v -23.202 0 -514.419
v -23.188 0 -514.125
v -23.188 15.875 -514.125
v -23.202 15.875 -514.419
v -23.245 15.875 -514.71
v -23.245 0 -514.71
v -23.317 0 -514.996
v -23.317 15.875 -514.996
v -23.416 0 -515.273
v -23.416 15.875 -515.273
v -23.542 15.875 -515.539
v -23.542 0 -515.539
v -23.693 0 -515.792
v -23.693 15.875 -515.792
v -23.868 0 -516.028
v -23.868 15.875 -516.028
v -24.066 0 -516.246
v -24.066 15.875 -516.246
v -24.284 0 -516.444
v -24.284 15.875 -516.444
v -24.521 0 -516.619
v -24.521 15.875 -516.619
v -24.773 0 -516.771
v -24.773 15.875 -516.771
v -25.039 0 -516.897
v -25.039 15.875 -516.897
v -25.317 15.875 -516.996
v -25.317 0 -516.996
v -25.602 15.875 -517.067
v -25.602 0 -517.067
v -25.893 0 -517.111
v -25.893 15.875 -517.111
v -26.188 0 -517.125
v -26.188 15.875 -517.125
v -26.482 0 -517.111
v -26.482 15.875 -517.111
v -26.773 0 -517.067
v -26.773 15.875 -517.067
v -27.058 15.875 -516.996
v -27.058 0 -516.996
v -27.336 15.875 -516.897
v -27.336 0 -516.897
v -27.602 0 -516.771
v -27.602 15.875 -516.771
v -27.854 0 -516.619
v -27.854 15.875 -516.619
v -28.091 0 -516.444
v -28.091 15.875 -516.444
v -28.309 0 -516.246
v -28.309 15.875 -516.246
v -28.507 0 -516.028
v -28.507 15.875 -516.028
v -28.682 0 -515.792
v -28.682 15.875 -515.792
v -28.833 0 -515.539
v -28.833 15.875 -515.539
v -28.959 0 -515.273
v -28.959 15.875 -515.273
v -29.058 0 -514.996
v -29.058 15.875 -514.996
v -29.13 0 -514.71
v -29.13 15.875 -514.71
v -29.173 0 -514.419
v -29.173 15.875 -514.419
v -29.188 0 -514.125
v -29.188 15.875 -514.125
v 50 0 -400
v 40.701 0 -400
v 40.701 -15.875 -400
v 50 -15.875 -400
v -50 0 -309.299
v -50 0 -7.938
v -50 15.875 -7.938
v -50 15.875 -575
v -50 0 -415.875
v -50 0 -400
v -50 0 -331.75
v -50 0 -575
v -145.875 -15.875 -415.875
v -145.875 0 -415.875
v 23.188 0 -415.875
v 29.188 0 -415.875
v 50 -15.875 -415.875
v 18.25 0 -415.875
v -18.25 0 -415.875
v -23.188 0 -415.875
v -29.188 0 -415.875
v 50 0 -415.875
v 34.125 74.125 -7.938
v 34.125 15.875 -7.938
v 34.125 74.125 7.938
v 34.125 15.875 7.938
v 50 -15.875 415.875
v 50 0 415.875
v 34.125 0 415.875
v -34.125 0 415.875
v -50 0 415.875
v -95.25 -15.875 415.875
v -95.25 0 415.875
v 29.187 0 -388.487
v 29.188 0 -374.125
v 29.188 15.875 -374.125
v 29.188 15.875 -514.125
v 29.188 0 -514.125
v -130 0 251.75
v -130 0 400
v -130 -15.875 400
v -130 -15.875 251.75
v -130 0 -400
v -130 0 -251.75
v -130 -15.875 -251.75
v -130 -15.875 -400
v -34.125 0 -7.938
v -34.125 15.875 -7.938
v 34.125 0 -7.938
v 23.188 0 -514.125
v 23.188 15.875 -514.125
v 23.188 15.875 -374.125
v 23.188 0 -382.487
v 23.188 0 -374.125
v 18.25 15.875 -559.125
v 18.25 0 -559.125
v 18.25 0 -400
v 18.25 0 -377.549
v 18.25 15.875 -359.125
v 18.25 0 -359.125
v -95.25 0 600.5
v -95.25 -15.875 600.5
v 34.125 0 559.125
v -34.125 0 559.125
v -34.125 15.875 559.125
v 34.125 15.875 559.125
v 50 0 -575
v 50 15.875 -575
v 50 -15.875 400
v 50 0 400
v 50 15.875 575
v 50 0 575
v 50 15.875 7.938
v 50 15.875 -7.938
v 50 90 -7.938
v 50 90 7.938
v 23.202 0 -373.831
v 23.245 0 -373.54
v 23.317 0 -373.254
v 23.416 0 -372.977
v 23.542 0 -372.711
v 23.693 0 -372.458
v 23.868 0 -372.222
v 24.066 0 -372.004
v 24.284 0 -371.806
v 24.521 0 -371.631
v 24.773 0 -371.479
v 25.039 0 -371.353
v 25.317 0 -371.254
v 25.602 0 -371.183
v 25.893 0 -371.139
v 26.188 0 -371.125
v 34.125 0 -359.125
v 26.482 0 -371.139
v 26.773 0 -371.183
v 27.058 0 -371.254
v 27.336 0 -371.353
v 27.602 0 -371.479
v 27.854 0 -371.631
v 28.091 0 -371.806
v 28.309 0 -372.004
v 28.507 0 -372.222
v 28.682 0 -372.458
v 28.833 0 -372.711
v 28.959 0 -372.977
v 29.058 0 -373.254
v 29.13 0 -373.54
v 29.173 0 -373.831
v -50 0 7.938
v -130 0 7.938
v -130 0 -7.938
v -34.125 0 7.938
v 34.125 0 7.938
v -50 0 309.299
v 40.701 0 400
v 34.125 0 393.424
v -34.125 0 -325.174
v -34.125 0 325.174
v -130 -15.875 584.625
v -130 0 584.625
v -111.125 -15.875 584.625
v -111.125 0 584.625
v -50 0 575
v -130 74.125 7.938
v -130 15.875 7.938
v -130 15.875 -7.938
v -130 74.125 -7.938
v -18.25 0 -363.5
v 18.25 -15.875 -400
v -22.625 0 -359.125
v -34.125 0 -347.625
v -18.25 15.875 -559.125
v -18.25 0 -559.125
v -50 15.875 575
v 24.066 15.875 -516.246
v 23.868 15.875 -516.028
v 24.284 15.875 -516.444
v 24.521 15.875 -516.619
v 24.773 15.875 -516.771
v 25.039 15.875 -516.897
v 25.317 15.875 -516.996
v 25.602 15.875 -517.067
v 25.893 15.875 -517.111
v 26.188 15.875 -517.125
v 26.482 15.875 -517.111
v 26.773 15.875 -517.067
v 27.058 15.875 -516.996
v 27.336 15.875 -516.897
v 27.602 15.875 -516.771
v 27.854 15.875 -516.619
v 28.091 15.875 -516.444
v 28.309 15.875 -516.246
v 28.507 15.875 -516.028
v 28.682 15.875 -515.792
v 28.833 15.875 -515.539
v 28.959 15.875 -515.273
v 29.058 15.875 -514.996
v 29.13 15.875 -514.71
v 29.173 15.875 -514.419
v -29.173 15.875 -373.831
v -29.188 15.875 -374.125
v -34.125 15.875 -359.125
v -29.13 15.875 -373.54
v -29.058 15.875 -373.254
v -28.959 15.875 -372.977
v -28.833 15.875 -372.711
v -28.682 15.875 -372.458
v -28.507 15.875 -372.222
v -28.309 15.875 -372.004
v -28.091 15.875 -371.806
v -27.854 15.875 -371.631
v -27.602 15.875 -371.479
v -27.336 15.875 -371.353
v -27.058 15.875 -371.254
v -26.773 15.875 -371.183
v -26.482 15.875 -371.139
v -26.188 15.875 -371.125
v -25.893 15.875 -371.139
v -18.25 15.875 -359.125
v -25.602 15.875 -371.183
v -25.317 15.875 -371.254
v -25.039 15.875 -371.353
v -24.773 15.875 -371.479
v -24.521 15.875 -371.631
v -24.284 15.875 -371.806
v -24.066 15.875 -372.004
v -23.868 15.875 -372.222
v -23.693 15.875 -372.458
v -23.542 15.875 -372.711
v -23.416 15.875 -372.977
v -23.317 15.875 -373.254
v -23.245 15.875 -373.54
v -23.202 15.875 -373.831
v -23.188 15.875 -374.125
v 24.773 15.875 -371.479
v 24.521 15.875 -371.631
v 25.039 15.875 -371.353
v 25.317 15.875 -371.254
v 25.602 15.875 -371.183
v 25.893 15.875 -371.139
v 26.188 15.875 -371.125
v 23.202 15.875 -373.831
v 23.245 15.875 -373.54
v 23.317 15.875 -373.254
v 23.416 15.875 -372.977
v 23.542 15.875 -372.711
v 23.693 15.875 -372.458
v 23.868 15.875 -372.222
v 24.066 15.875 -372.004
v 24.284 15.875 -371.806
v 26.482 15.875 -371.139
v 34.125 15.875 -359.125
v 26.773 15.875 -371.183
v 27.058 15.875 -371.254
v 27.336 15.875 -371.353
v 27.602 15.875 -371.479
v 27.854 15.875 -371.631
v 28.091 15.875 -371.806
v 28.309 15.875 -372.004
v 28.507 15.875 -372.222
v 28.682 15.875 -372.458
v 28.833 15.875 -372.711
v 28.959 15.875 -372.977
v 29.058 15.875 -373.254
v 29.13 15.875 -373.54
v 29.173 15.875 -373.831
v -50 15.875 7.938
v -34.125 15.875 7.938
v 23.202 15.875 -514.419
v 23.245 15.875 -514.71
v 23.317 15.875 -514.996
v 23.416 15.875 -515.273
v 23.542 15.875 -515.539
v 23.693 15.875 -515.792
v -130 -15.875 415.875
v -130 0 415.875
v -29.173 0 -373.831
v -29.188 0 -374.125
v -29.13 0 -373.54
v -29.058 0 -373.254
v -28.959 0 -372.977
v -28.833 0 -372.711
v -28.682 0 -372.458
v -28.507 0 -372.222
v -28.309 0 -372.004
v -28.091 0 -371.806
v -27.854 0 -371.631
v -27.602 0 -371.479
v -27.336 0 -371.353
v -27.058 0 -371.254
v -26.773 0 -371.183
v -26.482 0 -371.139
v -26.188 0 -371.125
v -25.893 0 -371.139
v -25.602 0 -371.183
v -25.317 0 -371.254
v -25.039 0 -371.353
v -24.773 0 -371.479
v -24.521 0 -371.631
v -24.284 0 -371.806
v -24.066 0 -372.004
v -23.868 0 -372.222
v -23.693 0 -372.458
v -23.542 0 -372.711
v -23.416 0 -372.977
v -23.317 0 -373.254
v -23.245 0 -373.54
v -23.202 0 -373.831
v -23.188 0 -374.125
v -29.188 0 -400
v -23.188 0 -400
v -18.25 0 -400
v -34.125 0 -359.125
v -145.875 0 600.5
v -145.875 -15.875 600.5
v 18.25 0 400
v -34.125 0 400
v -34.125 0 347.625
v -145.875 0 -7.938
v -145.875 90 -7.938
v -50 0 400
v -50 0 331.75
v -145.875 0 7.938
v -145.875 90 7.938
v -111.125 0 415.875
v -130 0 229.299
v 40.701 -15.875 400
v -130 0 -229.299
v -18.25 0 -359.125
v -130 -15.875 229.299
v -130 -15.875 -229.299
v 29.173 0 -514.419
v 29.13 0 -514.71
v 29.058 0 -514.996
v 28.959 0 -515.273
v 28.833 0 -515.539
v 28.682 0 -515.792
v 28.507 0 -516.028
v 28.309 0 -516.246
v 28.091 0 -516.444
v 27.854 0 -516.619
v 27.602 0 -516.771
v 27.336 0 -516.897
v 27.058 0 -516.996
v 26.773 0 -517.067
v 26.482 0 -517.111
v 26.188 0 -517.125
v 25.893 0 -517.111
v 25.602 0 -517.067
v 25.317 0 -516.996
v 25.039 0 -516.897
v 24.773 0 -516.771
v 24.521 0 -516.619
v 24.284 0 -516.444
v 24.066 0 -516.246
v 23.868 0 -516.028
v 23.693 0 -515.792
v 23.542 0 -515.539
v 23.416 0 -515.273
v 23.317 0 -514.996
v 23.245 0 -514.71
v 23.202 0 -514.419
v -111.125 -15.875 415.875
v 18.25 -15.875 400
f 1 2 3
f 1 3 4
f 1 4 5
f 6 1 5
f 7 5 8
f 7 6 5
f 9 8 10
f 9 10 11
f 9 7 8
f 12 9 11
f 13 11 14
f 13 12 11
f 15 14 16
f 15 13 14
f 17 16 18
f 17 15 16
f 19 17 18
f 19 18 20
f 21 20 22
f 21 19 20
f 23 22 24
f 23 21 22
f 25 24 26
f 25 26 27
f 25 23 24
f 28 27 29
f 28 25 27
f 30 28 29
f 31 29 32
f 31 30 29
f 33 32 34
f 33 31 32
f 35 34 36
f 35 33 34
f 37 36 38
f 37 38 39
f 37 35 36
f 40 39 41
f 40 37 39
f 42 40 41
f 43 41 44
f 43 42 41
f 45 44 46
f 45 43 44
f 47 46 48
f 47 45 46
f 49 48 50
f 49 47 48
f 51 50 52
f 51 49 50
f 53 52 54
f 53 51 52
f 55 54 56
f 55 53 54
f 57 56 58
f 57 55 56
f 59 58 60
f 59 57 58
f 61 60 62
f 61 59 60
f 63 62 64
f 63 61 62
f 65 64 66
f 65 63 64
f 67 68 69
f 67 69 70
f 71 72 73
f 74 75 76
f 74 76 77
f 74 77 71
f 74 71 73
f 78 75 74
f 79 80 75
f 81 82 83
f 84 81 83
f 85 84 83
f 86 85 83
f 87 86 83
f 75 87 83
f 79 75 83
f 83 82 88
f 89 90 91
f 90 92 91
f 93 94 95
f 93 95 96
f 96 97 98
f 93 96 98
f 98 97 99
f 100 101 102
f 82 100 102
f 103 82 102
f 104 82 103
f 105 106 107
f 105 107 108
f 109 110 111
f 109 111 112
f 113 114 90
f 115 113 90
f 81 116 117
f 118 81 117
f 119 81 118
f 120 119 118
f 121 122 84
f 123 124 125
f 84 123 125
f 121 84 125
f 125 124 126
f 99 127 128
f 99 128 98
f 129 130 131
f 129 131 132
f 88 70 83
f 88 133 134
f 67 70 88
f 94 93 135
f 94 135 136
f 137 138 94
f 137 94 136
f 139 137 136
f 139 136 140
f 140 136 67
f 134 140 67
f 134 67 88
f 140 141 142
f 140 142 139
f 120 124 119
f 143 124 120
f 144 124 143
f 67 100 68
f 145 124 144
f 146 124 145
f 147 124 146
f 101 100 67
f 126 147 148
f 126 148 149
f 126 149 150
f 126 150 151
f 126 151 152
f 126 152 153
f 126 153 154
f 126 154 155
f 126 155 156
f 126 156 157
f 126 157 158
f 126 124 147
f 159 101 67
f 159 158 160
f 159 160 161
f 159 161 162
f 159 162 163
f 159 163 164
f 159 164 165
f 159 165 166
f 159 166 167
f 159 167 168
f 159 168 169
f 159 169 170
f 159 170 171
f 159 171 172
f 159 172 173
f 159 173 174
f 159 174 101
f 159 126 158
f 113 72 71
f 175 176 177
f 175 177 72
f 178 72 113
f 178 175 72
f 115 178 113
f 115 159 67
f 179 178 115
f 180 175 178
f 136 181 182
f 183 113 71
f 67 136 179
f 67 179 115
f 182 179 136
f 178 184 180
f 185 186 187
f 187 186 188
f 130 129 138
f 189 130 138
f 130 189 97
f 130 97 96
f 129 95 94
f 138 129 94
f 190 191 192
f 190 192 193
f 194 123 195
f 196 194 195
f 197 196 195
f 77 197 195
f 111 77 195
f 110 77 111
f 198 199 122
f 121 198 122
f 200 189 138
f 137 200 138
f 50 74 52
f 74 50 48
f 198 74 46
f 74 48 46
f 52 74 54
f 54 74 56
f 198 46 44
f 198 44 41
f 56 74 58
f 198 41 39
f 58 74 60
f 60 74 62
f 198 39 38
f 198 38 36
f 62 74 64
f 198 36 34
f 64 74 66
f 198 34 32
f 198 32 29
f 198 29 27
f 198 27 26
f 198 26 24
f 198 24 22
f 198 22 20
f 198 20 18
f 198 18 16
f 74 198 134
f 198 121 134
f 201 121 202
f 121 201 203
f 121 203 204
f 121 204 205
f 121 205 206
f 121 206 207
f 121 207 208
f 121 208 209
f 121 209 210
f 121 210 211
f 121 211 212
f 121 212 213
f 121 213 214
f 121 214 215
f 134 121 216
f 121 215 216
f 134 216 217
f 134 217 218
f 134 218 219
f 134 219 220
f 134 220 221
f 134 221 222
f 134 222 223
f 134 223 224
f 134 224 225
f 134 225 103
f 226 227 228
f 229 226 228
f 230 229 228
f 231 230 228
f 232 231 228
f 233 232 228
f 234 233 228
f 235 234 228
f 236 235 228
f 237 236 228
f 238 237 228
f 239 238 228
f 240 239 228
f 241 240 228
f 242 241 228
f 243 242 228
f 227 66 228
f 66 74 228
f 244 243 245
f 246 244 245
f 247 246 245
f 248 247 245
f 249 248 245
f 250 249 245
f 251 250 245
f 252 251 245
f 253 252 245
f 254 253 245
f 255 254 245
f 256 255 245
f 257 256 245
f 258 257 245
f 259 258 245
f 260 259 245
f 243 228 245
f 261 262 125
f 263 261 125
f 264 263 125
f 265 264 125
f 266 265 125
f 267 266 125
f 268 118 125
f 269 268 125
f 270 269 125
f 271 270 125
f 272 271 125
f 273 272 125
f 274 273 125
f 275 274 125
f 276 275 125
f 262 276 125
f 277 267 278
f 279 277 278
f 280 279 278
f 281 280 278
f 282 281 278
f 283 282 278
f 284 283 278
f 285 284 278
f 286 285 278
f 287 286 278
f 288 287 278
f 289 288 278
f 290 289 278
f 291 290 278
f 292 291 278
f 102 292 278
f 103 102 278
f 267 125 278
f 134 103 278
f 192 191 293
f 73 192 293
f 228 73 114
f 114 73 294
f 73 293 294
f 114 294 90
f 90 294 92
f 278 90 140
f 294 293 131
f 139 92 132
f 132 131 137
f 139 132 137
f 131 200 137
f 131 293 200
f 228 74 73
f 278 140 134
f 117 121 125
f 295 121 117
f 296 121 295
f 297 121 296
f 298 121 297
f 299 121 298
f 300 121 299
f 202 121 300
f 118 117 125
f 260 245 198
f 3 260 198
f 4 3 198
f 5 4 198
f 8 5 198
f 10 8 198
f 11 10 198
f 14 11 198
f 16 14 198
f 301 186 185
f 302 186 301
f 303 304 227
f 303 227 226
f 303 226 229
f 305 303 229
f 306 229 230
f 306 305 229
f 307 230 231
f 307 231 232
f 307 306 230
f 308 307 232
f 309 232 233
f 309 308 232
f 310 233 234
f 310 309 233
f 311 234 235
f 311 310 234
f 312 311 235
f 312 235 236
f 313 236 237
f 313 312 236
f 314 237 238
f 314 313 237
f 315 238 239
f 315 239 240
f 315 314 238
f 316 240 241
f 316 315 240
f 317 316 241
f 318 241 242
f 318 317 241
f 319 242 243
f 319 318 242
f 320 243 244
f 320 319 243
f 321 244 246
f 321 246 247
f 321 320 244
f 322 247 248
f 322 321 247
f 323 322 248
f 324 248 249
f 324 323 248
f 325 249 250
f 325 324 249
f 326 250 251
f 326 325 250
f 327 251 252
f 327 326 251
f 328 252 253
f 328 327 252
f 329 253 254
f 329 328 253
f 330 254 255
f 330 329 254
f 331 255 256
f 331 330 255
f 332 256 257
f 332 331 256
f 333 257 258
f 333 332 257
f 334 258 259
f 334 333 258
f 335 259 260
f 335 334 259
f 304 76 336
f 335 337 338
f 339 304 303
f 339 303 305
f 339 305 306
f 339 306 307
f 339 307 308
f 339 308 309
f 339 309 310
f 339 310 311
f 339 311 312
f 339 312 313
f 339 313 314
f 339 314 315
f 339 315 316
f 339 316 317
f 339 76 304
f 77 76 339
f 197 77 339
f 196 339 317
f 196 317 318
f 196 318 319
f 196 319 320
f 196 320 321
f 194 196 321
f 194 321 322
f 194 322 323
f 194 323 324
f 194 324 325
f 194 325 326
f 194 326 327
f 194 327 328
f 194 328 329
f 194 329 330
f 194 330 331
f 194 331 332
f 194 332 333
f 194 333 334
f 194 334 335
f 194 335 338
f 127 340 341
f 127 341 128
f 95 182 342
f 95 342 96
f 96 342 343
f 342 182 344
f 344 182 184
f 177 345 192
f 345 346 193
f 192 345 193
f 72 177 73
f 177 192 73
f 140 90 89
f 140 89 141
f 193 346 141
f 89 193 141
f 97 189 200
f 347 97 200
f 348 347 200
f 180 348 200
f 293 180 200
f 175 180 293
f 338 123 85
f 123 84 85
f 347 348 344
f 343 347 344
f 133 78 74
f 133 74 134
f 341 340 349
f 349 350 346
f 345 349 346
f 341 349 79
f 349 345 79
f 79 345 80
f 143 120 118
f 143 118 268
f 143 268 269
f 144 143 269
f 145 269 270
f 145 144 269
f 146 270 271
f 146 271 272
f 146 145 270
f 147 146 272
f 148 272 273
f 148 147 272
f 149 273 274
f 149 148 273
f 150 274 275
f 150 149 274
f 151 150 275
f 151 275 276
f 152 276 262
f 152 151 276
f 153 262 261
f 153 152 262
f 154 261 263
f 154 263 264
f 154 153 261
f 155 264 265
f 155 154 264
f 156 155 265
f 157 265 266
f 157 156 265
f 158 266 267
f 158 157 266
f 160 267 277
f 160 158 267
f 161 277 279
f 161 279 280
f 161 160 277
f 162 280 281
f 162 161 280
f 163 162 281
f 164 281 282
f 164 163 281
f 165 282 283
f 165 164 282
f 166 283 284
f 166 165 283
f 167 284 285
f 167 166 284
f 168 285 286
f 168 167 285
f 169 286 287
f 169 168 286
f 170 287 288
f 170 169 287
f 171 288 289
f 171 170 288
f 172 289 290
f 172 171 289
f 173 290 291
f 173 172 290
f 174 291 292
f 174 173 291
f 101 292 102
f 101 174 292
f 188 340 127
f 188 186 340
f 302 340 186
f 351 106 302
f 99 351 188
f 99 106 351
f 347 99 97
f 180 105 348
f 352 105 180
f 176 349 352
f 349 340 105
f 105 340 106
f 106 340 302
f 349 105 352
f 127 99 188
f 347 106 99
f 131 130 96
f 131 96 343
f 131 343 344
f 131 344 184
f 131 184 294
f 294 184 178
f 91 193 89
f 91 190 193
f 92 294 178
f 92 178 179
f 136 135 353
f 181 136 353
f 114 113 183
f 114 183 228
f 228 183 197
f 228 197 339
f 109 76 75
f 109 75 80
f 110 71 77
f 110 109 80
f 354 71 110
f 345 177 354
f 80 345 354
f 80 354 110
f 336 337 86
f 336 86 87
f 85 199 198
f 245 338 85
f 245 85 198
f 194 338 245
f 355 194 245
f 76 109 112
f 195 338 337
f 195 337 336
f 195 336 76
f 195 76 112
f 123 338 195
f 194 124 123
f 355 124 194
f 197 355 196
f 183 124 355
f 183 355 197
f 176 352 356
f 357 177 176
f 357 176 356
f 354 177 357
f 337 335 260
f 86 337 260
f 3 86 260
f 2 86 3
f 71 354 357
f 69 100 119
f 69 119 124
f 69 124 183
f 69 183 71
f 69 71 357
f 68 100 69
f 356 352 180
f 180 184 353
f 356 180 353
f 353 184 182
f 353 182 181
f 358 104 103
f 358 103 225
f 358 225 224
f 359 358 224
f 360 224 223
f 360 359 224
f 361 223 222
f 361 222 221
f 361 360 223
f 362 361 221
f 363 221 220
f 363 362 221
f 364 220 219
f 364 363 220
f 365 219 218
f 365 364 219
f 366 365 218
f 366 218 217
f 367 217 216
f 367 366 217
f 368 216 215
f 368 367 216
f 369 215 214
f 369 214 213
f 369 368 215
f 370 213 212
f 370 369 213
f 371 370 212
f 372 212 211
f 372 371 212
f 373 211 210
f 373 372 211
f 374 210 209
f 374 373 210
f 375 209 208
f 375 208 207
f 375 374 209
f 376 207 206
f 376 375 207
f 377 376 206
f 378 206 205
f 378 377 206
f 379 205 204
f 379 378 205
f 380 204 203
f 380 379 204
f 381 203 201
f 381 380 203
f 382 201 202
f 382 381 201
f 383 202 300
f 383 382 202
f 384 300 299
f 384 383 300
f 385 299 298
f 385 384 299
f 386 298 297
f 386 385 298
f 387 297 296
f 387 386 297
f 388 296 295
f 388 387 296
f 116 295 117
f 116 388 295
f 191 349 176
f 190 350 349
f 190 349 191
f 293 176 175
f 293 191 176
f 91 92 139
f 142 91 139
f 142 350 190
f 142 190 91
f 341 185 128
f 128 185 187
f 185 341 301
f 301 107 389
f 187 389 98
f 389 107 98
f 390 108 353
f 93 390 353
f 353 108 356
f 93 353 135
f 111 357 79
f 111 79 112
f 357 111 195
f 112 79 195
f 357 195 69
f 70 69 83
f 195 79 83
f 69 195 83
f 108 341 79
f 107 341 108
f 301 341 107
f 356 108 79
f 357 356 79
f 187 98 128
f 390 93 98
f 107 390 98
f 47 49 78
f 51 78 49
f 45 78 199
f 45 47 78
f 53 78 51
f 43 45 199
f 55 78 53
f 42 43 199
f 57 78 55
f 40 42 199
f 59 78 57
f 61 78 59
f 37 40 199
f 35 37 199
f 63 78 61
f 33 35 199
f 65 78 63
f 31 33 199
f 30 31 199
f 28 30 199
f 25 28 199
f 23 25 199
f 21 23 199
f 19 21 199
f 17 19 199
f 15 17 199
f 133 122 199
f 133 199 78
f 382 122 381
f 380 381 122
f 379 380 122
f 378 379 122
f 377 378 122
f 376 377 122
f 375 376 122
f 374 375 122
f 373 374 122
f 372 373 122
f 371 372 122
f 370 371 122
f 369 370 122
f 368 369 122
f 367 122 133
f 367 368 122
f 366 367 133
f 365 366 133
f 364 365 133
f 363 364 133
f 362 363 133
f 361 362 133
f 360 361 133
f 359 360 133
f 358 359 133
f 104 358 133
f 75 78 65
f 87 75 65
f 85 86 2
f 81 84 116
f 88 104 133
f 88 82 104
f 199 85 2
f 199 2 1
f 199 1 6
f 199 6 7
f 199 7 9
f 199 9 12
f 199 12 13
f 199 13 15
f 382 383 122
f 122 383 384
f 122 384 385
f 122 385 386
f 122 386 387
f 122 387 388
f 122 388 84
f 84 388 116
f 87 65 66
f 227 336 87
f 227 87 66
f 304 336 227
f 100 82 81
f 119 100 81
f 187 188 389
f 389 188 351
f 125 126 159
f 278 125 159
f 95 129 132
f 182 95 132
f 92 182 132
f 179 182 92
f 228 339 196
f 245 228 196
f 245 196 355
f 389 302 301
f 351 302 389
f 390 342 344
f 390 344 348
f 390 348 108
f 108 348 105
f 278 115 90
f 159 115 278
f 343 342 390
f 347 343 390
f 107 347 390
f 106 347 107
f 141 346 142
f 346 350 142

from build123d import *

# Parameters (mm, degrees)
SKETCH1_W           = 100
SKETCH1_H           = 1150
SKETCH1_W_2         = 68.25
SKETCH1_H_2         = 1118.25
BOSS_EXTRUDE1_DEPTH = 15.875
BOSS_EXTRUDE2_START = -15.875
BOSS_EXTRUDE2_DEPTH = 15.875
SKETCH5_W           = 195.875
SKETCH5_H           = 90
SKETCH5_W_2         = 164.125
SKETCH5_H_2         = 58.25
BOSS_EXTRUDE3_DEPTH = 7.9375
SKETCH6_W           = 15.875
SKETCH6_H           = 200
BOSS_EXTRUDE4_DEPTH = 15.875
CUT_EXTRUDE1_DEPTH  = 15.875
SKETCH8_W           = 50.625
SKETCH8_H           = 200.5
SKETCH8_W_2         = 18.875
SKETCH8_H_2         = 168.75
BOSS_EXTRUDE5_DEPTH = 15.875
BOSS_EXTRUDE6_DEPTH = 15.875


with BuildPart() as part:
    # Sketch1 → Boss-Extrude1 (new body)
    with BuildSketch(Plane(origin=(0, 0, 0), x_dir=(1, 0, 0), z_dir=(0, 1, 0))):
        Rectangle(SKETCH1_W, SKETCH1_H)
        Rectangle(SKETCH1_W_2, SKETCH1_H_2, mode=Mode.SUBTRACT)
    extrude(amount=BOSS_EXTRUDE1_DEPTH)

    # Sketch3 → Boss-Extrude2 (add)
    with BuildSketch(Plane(origin=(0, 15.875, 0), x_dir=(1, 0, 0), z_dir=(0, 1, 0)).offset(BOSS_EXTRUDE2_START)):
        Polygon((34.125, 400), (-130, 400), (-130, 220.59390888), (-130, -400), (34.125, -400), (50, -400), (50, -415.875), (-145.875, -415.875), (-145.875, 217.756753438), (-145.875, 415.875), (50, 415.875), (50, 400), align=None)
    extrude(amount=-BOSS_EXTRUDE2_DEPTH)

    # Sketch5 → Boss-Extrude3 (add, symmetric)
    with BuildSketch(Plane.XY):
        with Locations((-47.9375, 45)):
            Rectangle(SKETCH5_W, SKETCH5_H)
        with Locations((-47.9375, 45)):
            Rectangle(SKETCH5_W_2, SKETCH5_H_2, mode=Mode.SUBTRACT)
    extrude(amount=BOSS_EXTRUDE3_DEPTH, both=True)

    # Sketch6 → Boss-Extrude4 (add)
    with BuildSketch(Plane.XZ):
        with Locations((-26.1875, -459.125)):
            Rectangle(SKETCH6_W, SKETCH6_H)
        with Locations((26.1875, -459.125)):
            Rectangle(SKETCH6_W, SKETCH6_H)
    extrude(amount=-BOSS_EXTRUDE4_DEPTH)

    # Sketch7 → Cut-Extrude1 (cut)
    with BuildSketch(Plane.XZ):
        with BuildLine():
            Line((-23.1875, -374.125), (-23.1875, -514.125))
            ThreePointArc((-23.1875, -514.125), (-26.1875, -517.125), (-29.1875, -514.125))
            Line((-29.1875, -514.125), (-29.1875, -374.125))
            ThreePointArc((-29.1875, -374.125), (-26.1875, -371.125), (-23.1875, -374.125))
        make_face()
        with BuildLine():
            Line((29.1875, -374.125), (29.1875, -514.125))
            ThreePointArc((29.1875, -514.125), (26.1875, -517.125), (23.1875, -514.125))
            Line((23.1875, -514.125), (23.1875, -374.125))
            ThreePointArc((23.1875, -374.125), (26.1875, -371.125), (29.1875, -374.125))
        make_face()
    extrude(amount=-CUT_EXTRUDE1_DEPTH, mode=Mode.SUBTRACT)

    # Sketch8 → Boss-Extrude5 (add)
    with BuildSketch(Plane(origin=(0, 0, 0), x_dir=(1, 0, 0), z_dir=(0, 1, 0))):
        with Locations((-120.5625, -500.25)):
            Rectangle(SKETCH8_W, SKETCH8_H)
        with Locations((-120.5625, -500.25)):
            Rectangle(SKETCH8_W_2, SKETCH8_H_2, mode=Mode.SUBTRACT)
    extrude(amount=-BOSS_EXTRUDE5_DEPTH)

    # Sketch9 → Boss-Extrude6 (add)
    with BuildSketch(Plane(origin=(0, 0, 0), x_dir=(1, 0, 0), z_dir=(0, 1, 0))):
        Polygon((45.350320151, -404.649679849), (34.125, -415.875), (-145.875, -235.875), (-134.649679849, -224.649679849), align=None)
    boss_extrude6 = extrude(amount=-BOSS_EXTRUDE6_DEPTH)

    # Mirror1: Boss-Extrude6 across plane
    add(boss_extrude6.mirror(Plane.XY))


solid = part.part
